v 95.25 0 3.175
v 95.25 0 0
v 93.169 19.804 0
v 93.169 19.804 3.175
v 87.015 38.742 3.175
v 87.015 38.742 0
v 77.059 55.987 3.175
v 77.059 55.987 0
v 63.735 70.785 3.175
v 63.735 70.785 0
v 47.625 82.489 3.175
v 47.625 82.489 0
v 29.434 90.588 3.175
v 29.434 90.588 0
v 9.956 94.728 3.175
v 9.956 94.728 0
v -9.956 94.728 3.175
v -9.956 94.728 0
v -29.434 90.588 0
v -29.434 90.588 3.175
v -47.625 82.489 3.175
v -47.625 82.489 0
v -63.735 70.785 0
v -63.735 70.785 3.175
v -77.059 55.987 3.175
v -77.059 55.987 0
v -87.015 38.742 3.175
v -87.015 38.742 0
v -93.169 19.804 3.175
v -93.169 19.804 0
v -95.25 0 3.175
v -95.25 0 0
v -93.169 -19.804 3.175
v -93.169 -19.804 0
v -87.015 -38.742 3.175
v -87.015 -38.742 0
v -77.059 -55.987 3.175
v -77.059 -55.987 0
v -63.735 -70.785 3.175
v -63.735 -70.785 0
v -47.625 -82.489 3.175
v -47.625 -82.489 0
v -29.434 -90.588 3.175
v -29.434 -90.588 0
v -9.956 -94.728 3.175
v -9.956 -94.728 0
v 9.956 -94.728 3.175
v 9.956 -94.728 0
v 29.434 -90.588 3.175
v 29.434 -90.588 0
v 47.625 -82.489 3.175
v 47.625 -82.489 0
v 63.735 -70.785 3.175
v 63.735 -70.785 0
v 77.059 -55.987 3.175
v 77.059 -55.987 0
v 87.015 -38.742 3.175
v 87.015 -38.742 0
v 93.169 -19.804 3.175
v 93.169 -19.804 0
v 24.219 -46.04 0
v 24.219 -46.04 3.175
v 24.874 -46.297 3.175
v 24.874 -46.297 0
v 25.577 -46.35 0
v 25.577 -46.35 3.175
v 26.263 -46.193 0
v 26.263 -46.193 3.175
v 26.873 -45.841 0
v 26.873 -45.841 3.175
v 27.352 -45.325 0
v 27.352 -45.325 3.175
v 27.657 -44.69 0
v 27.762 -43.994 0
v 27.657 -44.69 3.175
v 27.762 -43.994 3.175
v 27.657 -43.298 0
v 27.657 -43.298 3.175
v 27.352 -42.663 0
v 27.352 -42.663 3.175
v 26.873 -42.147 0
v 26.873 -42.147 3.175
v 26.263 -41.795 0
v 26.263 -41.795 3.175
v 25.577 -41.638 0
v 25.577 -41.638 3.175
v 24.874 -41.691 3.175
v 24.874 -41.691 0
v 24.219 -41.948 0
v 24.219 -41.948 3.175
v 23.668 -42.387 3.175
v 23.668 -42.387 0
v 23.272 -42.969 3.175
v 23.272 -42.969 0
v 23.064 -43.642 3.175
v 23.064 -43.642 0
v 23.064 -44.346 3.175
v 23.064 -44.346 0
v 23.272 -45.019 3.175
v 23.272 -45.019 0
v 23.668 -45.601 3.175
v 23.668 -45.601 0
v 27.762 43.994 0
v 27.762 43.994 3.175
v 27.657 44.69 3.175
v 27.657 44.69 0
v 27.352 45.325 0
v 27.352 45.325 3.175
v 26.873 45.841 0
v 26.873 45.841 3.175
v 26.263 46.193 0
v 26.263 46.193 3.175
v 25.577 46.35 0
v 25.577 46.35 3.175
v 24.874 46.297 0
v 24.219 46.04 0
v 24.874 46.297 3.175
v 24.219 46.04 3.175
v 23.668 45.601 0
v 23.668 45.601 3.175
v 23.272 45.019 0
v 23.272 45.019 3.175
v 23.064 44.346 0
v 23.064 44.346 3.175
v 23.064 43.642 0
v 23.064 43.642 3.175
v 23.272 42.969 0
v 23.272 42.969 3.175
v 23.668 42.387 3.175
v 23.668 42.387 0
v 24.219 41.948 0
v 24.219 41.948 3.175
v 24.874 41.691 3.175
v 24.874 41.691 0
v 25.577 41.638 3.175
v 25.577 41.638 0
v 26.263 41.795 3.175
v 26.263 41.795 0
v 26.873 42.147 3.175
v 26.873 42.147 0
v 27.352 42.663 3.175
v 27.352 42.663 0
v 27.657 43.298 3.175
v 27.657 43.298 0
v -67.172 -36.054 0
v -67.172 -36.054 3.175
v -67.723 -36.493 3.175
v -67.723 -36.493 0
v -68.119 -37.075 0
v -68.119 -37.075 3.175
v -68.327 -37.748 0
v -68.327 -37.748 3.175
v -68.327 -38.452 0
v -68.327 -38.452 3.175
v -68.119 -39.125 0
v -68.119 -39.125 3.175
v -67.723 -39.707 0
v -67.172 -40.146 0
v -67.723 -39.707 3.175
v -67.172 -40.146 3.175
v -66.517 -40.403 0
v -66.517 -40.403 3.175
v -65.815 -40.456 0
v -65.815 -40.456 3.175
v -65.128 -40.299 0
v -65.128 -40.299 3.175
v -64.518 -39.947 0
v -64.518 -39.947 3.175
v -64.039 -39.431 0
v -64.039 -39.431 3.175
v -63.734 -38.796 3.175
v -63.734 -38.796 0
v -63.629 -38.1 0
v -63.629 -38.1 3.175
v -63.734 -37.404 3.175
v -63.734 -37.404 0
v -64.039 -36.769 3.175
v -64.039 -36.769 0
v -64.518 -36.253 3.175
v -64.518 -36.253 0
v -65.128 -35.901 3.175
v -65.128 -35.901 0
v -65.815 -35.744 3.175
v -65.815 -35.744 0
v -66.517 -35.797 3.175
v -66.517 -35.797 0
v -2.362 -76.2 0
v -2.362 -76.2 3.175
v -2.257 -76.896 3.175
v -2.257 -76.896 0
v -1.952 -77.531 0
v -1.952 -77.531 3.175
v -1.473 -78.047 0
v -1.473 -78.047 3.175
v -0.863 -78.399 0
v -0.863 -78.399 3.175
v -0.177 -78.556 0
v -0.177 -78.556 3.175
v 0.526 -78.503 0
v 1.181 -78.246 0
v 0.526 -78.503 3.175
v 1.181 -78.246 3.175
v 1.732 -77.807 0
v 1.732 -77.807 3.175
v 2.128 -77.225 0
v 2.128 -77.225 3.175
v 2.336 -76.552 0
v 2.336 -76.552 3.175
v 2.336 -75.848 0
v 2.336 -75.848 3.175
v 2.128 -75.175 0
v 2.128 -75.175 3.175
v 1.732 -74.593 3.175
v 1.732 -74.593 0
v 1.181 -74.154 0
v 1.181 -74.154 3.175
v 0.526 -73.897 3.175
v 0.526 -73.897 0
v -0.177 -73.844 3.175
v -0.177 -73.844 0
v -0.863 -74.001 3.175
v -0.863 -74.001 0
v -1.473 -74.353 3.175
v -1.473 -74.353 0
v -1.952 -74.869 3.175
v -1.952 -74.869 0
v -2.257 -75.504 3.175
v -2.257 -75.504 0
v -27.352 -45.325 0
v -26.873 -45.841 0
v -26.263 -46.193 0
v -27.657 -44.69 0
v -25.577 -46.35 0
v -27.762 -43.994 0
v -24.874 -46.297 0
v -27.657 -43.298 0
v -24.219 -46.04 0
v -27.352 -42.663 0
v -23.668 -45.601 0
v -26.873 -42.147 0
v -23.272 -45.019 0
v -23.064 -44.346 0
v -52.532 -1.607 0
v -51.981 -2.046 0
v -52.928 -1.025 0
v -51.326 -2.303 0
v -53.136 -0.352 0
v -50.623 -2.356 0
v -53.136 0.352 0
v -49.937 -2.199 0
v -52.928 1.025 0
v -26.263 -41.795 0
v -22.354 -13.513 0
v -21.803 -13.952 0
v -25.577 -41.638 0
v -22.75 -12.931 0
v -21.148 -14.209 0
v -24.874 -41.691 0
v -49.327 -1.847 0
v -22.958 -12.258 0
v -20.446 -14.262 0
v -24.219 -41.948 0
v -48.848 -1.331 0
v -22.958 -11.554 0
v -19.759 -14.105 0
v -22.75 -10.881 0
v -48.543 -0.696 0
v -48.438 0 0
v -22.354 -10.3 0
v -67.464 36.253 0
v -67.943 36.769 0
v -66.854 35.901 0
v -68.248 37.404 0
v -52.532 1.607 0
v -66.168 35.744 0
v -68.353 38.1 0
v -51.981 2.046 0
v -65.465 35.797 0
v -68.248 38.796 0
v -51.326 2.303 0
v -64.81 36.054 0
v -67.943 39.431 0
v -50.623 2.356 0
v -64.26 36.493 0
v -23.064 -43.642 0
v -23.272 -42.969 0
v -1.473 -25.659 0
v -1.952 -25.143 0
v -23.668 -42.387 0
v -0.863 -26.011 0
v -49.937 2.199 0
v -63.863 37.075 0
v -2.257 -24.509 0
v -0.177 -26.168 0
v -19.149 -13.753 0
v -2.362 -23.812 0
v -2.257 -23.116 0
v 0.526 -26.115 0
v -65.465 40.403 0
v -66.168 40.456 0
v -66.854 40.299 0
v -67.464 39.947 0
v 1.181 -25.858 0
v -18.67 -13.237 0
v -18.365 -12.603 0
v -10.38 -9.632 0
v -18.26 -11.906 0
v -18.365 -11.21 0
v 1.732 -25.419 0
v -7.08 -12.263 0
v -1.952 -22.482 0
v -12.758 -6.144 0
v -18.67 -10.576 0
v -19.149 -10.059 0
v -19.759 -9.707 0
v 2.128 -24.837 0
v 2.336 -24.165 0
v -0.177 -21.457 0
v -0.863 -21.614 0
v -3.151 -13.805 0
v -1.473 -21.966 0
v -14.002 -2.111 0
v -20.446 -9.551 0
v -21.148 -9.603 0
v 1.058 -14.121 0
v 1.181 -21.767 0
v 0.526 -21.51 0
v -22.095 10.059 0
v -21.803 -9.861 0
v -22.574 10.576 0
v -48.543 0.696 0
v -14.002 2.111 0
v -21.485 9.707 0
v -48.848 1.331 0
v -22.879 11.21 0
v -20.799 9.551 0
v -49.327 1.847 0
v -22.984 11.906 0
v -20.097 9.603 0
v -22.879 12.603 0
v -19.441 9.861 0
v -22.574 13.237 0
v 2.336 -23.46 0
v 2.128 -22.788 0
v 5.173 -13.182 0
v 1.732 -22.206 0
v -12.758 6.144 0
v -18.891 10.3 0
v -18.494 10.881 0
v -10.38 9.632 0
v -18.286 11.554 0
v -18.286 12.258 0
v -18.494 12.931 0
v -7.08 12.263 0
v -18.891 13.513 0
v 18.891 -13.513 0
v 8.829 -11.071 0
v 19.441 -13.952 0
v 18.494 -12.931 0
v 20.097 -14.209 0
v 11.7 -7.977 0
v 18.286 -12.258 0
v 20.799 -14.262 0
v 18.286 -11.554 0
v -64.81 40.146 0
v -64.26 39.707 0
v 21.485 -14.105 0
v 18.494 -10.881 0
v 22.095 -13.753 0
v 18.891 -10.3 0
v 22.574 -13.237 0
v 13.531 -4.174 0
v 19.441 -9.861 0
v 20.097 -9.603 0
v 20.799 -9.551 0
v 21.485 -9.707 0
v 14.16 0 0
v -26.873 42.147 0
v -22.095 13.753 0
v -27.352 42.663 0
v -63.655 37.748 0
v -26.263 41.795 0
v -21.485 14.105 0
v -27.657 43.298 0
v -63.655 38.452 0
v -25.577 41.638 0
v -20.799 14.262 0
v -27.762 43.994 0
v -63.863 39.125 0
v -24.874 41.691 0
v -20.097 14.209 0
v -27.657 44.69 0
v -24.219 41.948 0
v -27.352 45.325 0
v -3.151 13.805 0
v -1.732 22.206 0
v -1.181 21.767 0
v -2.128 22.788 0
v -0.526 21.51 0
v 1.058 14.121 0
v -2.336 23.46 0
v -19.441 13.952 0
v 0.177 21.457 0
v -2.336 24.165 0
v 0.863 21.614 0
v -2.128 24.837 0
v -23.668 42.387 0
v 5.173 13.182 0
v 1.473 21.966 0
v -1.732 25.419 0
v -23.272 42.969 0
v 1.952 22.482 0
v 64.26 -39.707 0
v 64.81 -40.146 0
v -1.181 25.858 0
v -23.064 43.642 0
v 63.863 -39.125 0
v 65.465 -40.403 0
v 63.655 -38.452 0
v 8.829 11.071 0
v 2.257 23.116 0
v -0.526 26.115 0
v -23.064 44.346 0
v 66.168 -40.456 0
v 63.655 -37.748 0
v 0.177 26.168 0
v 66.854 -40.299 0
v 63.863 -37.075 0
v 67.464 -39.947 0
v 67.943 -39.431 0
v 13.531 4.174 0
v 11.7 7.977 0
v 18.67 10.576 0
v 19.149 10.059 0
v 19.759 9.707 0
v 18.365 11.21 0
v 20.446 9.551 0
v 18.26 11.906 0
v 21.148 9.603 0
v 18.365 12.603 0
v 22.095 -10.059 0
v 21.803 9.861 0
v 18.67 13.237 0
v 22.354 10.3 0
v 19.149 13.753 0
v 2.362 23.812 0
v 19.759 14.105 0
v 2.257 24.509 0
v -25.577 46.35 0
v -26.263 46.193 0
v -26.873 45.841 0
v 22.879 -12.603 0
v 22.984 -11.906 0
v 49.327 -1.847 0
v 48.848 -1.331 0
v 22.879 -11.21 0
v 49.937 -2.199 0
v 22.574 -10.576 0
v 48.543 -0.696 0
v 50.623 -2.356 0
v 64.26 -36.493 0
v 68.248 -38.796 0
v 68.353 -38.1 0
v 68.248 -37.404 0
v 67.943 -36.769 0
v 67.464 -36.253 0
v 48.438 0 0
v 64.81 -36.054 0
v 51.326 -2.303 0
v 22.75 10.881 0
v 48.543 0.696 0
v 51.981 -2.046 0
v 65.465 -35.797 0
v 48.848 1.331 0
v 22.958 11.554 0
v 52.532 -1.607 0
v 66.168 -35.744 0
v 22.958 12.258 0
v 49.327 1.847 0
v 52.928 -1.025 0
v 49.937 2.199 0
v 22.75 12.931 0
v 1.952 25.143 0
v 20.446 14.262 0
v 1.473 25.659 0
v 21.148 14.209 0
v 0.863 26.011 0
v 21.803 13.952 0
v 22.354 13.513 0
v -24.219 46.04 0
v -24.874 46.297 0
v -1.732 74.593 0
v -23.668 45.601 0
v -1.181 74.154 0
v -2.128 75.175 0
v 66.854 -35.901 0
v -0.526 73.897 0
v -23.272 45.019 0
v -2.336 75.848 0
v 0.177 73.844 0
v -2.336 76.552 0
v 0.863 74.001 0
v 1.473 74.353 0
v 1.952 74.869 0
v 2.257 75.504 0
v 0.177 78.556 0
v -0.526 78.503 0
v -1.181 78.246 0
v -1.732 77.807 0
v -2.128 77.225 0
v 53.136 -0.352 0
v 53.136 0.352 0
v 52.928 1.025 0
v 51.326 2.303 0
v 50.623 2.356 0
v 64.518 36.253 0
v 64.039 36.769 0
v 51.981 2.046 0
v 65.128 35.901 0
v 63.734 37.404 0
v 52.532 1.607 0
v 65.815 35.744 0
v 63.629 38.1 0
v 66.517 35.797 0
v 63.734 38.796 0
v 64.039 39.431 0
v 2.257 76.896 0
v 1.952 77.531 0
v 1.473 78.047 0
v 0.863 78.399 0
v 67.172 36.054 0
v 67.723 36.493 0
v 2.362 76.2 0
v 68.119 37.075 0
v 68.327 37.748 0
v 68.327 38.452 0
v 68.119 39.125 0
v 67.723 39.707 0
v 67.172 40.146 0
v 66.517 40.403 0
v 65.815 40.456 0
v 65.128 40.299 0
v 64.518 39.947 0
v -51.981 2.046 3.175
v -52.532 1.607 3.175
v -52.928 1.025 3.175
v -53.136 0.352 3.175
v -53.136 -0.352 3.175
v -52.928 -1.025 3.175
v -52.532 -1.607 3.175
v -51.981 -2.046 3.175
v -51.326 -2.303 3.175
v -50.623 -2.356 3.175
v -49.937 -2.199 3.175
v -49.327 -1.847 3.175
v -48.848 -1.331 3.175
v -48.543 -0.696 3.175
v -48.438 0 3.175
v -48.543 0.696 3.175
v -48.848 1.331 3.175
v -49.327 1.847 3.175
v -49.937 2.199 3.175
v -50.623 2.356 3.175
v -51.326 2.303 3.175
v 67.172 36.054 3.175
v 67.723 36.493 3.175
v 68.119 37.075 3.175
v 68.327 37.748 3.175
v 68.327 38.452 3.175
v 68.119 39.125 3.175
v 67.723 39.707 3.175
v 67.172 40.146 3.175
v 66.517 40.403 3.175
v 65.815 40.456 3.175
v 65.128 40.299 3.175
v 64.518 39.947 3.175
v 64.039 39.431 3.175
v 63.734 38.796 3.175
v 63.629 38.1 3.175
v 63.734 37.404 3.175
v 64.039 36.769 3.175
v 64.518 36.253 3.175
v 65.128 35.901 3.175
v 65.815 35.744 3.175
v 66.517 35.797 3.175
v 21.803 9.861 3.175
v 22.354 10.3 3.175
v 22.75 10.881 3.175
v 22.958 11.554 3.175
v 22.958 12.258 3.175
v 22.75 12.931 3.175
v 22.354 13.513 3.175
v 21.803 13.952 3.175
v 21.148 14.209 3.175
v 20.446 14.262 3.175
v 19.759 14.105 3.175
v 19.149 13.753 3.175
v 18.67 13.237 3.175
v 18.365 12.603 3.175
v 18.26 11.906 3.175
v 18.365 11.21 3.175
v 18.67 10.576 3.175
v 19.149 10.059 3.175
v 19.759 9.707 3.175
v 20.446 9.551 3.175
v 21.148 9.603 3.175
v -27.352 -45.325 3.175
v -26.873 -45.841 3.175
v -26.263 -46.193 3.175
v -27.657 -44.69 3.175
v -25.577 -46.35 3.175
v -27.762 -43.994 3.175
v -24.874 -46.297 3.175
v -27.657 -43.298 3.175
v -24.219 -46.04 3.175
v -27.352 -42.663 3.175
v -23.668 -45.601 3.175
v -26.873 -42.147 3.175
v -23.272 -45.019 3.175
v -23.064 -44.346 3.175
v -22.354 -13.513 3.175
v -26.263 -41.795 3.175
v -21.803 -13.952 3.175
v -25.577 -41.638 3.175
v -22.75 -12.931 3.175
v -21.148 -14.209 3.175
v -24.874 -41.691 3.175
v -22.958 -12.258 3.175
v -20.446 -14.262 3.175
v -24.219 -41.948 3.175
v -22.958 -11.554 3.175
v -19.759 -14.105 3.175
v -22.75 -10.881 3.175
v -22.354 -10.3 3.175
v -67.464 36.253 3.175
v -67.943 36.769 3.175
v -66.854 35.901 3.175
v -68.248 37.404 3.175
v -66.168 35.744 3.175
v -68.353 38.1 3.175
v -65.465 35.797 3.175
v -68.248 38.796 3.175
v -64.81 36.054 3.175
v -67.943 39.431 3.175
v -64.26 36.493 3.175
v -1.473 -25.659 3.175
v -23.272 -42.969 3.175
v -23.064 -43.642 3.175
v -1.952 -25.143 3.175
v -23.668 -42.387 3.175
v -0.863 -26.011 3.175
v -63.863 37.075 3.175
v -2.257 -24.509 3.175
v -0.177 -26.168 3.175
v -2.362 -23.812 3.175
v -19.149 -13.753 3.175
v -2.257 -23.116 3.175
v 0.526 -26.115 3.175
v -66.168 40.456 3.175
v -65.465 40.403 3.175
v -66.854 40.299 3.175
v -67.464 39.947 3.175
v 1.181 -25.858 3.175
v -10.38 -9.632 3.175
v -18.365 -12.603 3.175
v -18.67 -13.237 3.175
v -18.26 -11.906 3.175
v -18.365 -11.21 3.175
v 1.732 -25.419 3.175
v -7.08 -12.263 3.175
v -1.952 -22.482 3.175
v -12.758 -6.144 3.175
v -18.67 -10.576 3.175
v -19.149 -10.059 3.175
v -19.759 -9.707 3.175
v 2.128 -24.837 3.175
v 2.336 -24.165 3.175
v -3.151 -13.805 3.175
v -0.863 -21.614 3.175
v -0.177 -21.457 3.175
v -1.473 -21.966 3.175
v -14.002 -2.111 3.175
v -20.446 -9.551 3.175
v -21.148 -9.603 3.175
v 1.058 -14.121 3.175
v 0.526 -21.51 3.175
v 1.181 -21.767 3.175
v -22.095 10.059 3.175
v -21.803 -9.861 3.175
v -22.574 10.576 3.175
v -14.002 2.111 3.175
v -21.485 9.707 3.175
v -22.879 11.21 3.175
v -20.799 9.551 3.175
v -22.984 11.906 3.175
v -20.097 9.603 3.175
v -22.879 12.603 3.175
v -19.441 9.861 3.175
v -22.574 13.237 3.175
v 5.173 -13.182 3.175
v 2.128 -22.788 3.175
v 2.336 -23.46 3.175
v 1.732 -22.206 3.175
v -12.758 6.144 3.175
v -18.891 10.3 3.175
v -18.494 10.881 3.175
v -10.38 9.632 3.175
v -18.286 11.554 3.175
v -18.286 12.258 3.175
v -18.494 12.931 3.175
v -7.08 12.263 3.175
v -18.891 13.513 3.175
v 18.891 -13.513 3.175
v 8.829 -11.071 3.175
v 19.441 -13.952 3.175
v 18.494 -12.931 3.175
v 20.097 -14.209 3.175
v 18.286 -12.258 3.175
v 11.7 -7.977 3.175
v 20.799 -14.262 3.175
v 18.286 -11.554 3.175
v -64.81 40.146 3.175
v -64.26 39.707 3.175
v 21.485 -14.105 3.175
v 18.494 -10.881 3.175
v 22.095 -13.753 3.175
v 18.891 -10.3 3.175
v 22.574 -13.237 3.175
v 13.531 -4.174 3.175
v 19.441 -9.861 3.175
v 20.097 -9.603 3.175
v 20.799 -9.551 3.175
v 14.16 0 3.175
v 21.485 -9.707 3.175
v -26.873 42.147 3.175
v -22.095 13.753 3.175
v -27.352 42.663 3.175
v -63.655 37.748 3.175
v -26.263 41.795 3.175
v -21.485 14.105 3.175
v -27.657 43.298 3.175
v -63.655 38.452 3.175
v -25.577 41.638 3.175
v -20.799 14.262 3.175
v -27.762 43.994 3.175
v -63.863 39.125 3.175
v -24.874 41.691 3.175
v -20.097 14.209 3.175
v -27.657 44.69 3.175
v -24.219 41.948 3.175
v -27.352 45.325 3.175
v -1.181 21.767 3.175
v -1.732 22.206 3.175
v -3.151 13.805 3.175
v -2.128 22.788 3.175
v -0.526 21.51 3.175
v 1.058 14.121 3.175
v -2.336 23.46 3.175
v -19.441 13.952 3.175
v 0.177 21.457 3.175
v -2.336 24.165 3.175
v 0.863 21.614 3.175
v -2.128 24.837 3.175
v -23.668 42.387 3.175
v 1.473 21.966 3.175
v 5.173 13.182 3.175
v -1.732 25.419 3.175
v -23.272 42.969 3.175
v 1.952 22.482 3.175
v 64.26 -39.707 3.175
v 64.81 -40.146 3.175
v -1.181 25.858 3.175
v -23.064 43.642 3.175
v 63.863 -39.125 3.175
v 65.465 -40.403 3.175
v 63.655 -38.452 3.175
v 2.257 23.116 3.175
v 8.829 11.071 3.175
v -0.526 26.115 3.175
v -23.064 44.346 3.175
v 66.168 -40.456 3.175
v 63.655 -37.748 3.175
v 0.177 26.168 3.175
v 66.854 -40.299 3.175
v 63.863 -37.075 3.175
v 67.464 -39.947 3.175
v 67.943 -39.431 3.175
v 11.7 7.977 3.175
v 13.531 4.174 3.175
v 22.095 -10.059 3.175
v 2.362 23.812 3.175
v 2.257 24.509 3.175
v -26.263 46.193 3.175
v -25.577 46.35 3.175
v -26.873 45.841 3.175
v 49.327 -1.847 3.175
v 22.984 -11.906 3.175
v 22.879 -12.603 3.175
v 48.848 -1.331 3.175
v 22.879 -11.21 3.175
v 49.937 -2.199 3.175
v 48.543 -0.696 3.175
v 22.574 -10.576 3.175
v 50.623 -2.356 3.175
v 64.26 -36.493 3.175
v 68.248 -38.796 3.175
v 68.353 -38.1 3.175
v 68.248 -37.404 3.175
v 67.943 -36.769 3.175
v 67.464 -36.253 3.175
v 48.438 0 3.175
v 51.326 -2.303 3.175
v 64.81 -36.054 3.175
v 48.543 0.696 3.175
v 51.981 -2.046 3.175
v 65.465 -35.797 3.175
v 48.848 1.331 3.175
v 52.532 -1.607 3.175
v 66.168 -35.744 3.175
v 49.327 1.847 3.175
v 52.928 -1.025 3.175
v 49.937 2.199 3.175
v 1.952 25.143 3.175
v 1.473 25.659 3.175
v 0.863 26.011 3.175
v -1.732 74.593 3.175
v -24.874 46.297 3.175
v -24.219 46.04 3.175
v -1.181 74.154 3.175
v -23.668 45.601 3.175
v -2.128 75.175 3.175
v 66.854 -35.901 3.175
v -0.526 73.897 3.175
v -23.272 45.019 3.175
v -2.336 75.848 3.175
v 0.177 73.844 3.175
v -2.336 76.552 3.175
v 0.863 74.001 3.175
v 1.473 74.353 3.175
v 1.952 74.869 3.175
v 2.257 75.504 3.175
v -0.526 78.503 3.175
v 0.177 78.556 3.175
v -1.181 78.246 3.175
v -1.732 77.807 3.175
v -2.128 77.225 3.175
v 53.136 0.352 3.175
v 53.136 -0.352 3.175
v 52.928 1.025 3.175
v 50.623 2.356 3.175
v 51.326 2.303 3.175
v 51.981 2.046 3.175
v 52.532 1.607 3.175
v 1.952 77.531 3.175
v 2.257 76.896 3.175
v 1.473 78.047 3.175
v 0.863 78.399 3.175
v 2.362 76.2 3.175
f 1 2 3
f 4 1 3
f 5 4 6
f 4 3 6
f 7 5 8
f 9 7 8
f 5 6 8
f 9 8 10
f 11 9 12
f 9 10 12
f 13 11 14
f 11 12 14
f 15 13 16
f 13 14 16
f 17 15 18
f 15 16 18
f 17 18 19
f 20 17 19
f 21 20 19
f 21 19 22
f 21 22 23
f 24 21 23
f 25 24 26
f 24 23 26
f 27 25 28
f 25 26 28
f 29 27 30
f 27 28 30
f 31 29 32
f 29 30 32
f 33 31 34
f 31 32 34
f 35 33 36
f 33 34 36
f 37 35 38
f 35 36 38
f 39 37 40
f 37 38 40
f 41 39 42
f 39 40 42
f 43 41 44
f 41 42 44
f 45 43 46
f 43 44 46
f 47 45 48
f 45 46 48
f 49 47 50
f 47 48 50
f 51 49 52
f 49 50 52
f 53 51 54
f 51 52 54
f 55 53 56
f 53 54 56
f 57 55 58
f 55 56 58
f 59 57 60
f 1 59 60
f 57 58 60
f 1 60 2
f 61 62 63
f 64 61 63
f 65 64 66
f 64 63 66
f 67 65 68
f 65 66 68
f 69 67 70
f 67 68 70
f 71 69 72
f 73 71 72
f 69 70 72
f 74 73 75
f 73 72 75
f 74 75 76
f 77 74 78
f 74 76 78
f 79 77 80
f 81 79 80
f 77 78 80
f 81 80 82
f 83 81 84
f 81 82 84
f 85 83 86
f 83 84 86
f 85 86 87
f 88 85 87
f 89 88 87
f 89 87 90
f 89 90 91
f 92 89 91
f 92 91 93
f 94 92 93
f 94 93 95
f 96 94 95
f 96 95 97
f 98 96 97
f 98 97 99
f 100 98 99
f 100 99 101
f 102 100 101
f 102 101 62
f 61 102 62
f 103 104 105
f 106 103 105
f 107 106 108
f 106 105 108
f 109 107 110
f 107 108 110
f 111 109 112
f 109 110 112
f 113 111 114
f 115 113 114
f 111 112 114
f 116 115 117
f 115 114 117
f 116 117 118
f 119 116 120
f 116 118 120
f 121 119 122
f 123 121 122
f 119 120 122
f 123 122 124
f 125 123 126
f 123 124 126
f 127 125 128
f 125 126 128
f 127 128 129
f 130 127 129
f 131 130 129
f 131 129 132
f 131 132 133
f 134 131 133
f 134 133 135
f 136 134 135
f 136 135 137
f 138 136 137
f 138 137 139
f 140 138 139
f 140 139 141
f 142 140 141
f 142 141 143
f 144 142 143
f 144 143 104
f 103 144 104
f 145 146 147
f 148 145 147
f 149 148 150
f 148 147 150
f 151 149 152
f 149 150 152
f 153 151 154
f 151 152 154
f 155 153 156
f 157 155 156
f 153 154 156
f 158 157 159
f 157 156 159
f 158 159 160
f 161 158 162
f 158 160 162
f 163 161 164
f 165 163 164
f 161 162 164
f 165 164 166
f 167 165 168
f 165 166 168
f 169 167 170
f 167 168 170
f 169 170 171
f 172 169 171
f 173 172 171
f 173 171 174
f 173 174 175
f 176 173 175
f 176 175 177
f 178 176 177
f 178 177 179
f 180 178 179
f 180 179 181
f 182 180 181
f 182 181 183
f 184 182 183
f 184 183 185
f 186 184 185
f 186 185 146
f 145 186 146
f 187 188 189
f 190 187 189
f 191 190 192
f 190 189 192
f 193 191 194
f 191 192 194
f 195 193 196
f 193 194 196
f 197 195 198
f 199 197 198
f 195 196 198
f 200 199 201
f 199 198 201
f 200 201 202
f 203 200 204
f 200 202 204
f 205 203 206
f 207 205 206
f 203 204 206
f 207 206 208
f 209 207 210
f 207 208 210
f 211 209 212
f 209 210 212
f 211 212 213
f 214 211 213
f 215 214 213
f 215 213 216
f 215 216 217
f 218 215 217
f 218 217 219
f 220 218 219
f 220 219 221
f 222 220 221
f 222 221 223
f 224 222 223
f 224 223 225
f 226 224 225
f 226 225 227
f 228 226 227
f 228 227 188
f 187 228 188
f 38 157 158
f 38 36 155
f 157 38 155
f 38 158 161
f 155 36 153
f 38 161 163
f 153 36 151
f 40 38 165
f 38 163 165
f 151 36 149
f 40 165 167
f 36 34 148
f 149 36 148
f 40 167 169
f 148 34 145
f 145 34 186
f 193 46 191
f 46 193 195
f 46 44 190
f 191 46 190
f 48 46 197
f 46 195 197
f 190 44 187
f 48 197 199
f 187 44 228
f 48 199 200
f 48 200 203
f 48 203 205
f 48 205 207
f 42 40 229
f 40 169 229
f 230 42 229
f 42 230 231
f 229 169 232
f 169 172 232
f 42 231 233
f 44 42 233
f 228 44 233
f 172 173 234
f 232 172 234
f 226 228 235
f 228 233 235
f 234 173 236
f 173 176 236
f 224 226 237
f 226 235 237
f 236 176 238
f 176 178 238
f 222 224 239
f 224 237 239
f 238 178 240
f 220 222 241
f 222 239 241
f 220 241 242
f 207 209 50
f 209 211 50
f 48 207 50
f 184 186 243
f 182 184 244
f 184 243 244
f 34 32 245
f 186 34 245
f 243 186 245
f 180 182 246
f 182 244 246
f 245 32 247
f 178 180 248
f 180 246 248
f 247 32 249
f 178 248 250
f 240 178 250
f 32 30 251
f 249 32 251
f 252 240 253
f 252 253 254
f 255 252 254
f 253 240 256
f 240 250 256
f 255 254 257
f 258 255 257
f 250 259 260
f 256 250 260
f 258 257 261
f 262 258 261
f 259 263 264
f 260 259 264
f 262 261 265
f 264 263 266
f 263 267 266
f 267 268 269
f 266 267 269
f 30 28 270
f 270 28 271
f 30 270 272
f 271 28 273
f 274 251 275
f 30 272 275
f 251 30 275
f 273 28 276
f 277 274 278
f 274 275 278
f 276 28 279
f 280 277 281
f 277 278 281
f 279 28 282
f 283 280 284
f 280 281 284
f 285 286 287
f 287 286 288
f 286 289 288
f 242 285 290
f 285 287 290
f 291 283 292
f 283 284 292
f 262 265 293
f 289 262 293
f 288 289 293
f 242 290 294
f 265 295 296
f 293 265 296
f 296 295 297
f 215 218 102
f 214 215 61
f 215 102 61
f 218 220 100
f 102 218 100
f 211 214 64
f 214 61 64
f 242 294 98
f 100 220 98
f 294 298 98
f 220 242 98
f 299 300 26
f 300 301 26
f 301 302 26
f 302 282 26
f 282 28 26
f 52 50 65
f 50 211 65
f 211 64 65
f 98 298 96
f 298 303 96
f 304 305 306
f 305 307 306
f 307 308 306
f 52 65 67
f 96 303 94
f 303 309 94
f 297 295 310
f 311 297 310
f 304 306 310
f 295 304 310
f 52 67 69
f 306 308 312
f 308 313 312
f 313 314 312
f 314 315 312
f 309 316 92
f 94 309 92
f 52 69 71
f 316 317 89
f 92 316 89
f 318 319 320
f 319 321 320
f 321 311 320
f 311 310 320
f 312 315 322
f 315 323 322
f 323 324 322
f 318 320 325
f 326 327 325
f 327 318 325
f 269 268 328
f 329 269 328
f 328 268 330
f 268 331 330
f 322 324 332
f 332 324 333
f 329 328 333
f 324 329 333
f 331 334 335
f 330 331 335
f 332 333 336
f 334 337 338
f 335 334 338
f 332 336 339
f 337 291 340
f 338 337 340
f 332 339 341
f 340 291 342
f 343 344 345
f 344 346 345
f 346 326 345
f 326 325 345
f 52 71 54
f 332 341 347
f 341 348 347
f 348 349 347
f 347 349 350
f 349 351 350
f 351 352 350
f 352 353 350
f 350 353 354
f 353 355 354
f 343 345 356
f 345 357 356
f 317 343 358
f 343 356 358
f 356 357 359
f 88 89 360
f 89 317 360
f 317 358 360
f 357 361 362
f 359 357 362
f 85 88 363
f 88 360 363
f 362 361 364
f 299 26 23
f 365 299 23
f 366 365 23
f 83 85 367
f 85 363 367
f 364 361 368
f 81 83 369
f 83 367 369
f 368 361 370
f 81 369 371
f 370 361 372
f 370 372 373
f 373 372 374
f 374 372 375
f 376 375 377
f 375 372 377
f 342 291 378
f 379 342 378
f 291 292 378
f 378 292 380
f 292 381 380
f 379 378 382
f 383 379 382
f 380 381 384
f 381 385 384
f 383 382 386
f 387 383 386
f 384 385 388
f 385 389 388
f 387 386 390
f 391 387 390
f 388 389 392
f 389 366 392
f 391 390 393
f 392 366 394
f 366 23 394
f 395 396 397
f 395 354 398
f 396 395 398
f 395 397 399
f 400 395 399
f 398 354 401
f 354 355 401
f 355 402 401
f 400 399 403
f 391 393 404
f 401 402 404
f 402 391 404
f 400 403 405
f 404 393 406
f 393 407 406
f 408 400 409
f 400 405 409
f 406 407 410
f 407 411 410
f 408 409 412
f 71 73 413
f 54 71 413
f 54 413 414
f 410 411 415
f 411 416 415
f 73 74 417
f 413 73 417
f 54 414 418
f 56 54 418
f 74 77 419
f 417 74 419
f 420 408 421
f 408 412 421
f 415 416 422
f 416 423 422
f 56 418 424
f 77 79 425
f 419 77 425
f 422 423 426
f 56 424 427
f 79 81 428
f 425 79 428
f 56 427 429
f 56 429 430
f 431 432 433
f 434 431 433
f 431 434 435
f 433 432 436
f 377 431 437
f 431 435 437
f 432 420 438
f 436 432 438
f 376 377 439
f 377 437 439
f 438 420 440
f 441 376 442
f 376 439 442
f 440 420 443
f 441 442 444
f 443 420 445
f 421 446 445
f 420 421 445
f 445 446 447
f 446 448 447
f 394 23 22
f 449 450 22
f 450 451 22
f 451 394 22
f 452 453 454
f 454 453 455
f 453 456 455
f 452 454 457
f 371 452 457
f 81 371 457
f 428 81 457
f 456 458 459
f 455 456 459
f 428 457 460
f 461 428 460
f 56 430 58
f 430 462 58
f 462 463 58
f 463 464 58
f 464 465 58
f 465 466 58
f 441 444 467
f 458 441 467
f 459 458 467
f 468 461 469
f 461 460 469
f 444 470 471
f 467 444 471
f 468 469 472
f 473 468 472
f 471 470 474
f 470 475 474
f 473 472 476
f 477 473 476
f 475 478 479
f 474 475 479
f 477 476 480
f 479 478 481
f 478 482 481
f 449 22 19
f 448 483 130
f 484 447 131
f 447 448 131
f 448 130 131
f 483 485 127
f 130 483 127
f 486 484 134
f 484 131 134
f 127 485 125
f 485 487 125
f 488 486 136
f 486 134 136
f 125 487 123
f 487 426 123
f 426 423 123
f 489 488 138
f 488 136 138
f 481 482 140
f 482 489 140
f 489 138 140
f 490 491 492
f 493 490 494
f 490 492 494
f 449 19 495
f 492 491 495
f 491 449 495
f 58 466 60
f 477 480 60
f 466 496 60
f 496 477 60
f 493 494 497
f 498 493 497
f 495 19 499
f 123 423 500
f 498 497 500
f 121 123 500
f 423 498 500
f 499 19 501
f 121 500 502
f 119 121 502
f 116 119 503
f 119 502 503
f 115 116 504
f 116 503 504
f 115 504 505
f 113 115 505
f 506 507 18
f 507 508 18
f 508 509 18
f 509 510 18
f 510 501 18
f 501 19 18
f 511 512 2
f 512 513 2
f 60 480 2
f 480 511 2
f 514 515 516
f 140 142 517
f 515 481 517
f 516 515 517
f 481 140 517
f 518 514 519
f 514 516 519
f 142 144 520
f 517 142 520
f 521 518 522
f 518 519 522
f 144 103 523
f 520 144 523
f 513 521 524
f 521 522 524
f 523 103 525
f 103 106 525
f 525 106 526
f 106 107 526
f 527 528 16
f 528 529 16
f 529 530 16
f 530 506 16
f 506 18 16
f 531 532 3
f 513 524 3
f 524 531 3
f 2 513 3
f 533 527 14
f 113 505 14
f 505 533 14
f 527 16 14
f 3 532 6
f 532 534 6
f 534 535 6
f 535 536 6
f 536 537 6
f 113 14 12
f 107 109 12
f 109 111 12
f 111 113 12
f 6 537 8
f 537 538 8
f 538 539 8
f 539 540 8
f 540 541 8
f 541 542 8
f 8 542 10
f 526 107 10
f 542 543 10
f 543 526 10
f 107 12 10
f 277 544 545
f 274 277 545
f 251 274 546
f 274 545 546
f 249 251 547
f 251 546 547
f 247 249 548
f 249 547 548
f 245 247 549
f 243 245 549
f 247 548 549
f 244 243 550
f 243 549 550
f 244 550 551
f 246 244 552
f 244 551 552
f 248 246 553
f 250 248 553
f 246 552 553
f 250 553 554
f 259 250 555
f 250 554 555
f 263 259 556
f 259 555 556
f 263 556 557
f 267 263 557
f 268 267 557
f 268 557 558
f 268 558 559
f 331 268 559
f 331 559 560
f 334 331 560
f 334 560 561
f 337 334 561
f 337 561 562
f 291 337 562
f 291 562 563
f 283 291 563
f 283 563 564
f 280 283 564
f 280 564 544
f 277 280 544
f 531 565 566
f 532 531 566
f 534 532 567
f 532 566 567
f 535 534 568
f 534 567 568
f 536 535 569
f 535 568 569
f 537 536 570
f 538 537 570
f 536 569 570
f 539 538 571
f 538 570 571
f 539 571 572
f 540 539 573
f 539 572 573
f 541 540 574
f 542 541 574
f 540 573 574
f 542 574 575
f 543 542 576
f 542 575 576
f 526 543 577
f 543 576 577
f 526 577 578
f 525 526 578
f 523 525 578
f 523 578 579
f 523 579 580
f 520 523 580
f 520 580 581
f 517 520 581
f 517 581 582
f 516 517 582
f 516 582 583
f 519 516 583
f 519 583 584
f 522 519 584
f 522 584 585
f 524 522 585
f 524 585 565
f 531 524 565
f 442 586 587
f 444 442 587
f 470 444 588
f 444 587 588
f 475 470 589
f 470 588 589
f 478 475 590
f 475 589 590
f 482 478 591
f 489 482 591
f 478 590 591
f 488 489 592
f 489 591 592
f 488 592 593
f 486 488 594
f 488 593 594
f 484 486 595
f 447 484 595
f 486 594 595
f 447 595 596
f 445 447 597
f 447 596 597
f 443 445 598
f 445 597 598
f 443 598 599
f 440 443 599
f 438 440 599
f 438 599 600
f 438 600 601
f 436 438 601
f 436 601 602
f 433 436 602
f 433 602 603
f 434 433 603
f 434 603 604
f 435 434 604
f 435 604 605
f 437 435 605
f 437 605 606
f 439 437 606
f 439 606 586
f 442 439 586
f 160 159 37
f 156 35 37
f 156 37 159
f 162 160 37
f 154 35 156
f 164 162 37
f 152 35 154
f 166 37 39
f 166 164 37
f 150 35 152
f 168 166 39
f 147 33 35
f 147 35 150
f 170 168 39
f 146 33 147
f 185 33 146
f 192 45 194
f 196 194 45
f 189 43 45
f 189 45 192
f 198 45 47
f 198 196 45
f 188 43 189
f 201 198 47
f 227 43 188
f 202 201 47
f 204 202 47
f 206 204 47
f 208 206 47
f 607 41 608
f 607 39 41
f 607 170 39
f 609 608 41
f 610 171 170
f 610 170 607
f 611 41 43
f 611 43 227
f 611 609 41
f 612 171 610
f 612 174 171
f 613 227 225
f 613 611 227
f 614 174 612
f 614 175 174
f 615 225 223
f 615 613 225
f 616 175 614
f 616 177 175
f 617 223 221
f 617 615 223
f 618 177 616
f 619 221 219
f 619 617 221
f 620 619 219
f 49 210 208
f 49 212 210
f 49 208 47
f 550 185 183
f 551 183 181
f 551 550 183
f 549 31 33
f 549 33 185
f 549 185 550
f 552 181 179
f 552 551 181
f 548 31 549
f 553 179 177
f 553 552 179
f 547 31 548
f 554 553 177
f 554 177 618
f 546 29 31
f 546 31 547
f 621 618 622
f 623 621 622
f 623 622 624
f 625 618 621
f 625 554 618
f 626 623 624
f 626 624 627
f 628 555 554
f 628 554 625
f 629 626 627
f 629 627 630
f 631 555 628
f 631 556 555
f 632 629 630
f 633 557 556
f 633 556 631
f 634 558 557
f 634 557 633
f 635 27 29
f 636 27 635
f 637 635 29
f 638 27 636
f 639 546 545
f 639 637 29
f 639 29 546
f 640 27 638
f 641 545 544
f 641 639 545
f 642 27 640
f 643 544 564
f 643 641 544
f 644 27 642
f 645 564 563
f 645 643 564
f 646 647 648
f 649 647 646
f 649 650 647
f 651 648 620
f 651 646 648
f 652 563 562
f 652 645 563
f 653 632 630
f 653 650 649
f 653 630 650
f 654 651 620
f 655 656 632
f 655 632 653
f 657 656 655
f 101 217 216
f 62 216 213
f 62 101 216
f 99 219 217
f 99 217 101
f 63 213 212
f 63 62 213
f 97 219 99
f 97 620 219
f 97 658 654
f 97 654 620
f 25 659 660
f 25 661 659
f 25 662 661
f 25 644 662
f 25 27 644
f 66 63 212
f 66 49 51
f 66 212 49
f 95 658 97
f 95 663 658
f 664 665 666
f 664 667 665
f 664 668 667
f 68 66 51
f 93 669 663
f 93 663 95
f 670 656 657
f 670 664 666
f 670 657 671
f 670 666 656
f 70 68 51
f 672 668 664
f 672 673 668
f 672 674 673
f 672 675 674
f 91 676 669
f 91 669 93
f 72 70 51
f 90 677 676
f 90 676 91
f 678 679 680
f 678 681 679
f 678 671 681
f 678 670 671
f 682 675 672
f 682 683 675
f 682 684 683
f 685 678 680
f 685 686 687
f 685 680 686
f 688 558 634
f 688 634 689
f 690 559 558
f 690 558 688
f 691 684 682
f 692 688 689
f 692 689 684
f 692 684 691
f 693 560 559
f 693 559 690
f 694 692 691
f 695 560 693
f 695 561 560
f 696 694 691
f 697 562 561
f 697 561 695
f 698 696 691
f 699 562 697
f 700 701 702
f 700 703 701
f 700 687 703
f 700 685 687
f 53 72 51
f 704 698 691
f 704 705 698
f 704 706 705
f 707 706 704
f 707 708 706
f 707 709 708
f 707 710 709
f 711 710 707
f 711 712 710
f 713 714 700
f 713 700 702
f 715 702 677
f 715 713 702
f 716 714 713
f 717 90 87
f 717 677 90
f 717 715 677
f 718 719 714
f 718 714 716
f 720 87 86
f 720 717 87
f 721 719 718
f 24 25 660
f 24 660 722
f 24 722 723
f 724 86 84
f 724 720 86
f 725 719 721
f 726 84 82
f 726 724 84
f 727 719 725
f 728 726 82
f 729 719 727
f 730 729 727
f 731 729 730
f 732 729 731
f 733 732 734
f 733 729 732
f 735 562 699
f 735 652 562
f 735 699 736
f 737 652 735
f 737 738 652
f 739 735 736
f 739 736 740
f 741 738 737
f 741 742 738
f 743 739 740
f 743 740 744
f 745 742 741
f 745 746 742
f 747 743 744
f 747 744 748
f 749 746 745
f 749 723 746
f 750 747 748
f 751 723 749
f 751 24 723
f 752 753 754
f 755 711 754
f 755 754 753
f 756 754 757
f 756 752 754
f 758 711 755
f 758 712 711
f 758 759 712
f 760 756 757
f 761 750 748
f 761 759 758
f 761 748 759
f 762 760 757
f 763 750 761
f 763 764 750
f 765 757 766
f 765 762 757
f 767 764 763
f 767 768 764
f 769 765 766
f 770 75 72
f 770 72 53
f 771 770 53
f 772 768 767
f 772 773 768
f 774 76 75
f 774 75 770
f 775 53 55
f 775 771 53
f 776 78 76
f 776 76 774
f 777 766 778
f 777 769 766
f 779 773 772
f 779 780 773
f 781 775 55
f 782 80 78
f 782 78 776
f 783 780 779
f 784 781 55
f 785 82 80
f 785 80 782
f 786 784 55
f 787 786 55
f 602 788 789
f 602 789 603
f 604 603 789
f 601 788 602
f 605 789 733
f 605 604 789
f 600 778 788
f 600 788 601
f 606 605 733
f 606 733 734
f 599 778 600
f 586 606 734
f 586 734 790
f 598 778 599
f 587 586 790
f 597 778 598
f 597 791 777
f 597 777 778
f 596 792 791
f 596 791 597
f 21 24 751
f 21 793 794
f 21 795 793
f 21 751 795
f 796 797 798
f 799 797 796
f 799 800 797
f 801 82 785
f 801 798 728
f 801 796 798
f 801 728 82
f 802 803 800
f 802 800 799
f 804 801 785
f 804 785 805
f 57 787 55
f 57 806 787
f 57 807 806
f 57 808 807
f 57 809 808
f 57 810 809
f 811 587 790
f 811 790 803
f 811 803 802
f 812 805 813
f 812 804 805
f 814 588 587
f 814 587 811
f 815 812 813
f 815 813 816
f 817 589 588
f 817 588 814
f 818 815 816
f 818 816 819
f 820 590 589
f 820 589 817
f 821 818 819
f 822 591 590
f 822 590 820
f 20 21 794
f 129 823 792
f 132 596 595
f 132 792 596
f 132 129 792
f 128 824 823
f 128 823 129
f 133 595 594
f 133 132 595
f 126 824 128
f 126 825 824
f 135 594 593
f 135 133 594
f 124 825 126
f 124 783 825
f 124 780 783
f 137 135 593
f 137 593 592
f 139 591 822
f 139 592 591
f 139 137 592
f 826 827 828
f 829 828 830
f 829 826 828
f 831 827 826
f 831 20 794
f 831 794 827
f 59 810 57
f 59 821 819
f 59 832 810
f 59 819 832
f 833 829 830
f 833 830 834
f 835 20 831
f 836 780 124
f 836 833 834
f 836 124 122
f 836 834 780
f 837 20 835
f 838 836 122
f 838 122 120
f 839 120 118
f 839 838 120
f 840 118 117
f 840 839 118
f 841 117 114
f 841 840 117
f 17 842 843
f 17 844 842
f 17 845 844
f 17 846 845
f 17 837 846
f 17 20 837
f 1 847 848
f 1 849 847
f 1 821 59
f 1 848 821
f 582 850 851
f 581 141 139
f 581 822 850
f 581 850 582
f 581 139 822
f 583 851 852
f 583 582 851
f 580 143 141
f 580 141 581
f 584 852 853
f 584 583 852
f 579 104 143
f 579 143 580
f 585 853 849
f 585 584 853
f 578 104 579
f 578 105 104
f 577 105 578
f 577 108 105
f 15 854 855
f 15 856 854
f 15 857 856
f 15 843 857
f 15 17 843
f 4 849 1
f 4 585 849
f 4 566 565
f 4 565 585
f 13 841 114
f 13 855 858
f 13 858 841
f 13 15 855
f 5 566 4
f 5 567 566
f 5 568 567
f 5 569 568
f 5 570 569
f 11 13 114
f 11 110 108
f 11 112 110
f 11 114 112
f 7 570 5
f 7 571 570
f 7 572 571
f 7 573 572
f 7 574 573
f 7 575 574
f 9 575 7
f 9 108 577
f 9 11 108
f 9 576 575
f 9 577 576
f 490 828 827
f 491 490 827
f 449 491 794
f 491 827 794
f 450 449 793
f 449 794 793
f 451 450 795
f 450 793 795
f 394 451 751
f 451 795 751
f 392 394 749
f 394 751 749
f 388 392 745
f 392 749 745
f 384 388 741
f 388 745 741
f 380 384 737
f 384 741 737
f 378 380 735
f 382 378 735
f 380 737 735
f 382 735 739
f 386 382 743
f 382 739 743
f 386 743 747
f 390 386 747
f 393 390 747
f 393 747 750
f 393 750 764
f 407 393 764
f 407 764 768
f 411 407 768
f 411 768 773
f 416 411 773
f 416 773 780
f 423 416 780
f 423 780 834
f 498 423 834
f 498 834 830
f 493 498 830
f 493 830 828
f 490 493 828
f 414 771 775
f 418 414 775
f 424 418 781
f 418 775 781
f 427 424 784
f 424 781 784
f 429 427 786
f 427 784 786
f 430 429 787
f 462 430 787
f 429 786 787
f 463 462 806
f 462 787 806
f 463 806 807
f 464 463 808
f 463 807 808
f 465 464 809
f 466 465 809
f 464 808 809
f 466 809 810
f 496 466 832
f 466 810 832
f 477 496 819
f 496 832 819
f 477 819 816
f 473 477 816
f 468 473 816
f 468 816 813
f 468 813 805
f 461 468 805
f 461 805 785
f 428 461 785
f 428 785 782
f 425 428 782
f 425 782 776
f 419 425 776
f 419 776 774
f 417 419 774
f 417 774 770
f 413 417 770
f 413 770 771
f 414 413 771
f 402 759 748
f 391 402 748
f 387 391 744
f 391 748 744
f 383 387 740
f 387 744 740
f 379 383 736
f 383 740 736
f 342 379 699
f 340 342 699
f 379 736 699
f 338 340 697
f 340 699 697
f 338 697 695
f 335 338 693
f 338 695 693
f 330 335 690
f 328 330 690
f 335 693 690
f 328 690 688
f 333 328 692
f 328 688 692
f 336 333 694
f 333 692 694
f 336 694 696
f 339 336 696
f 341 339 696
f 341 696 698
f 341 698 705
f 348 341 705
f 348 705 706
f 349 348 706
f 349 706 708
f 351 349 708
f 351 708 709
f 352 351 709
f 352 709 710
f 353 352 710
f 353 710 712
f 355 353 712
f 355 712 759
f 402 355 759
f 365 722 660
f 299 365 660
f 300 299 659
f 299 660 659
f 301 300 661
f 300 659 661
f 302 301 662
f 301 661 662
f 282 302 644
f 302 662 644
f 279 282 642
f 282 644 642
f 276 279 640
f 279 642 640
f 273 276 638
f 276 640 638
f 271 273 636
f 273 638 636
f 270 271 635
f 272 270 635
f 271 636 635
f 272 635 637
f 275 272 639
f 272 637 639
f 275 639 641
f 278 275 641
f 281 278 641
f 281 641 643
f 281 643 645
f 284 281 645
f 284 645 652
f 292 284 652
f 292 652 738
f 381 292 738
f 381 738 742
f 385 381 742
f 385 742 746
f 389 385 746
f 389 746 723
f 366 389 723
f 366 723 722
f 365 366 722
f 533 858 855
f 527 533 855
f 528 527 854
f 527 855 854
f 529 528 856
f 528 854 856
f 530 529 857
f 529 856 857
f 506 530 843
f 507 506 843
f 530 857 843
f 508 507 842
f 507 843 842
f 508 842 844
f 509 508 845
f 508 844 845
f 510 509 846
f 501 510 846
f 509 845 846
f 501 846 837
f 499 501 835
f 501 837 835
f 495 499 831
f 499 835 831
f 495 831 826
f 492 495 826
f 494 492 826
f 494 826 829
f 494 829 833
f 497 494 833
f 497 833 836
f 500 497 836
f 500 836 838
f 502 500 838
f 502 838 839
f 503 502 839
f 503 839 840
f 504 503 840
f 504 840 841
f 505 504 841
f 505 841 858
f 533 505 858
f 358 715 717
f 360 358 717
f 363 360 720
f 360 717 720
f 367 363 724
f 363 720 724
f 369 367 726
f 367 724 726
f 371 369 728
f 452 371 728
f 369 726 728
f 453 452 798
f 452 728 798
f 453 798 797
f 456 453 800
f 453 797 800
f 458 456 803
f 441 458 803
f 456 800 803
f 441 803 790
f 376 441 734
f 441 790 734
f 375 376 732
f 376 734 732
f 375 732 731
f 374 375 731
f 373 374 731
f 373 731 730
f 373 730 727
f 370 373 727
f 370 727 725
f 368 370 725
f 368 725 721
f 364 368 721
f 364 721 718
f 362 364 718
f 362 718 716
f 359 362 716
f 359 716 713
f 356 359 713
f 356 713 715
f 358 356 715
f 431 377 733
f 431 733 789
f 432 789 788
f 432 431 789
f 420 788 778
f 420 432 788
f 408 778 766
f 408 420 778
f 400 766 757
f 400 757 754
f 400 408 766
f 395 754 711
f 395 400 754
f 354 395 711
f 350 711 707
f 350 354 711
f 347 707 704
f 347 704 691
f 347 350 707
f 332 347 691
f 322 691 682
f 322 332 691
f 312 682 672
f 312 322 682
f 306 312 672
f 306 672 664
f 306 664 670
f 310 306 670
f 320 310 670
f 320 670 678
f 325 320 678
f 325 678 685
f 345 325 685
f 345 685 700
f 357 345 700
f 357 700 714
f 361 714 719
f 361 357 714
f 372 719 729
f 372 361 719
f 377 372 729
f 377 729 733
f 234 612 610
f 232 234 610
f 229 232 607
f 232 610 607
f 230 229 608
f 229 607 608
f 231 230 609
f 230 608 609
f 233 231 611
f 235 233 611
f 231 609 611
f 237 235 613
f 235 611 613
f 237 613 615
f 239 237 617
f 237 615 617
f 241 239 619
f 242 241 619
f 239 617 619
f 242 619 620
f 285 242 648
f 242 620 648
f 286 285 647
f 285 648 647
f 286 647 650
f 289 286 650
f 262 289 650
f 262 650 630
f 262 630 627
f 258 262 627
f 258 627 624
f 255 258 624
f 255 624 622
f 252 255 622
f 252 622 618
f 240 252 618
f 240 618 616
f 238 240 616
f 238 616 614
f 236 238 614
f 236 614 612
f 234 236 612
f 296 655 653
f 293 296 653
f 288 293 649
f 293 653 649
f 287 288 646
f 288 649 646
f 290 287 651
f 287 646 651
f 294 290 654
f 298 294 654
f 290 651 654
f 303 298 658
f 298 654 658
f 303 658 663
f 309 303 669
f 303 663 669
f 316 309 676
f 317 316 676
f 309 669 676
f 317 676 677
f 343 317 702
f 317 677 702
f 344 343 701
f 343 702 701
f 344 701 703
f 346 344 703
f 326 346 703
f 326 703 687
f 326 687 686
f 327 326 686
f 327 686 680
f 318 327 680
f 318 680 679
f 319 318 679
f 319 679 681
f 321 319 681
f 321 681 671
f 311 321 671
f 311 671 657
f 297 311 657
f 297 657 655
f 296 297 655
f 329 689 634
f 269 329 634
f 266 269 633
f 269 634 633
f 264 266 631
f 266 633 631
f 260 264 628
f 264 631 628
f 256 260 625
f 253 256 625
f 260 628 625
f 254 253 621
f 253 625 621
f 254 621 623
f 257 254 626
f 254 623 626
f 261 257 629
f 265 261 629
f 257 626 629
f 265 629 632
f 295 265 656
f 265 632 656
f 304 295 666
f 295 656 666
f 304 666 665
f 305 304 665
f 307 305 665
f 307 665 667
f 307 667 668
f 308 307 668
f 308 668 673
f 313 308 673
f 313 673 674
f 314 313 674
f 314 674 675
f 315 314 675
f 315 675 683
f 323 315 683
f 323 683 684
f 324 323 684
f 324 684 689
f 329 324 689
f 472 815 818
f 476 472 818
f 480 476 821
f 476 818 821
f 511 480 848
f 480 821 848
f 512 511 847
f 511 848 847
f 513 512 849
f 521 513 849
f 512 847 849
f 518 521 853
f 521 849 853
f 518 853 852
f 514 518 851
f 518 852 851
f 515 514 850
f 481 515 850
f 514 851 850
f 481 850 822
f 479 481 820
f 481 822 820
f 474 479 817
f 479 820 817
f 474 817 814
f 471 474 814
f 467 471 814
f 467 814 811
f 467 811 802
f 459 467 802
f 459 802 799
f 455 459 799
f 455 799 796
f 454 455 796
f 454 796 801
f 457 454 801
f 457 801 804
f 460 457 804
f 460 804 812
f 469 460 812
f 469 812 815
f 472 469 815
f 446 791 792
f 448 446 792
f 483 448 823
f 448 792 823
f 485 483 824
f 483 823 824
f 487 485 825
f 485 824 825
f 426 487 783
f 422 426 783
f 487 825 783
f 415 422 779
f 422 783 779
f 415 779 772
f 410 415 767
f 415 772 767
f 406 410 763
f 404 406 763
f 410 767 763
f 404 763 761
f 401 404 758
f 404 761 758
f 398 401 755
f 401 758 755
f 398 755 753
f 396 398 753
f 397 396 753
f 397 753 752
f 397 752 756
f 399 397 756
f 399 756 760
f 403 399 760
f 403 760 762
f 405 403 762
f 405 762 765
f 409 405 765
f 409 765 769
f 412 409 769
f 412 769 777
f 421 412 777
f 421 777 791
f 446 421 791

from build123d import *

# Parameters (mm, degrees)
F0_R            = 95.25
F0_R_2          = 14.1605
F1_DEPTH        = 3.175
F2_R            = 2.3622
F3_DEPTH        = 3.176
F3_COPIES_COUNT = 6


# Not quite as in the source:
# - a pattern or mirror of a feature is missing from the dataset's text; its kind, count and spacing are read off the source's solid


with BuildPart() as f1:
    # F0 (on Top) → F1 (new body)
    with BuildSketch(Plane.XY):
        Circle(F0_R)
        Circle(F0_R_2, mode=Mode.SUBTRACT)
    extrude(amount=F1_DEPTH)

    # F2 (on face) → F3 (cut, through all)
    with BuildSketch(Plane.XY.offset(3.175)):
        with Locations((0, 23.8125)):
            Circle(F2_R)
        with Locations((0, 76.2)):
            Circle(F2_R)
        with Locations((25.4, 43.9940905122)):
            Circle(F2_R)
    f3 = extrude(amount=-F3_DEPTH, mode=Mode.SUBTRACT)

    # F3_copies: F3 ×6 about axis
    f3_copies_axis = Axis((0, 0, 0), (0, 0, 1))
    for i in range(1, F3_COPIES_COUNT):
        add(f3.rotate(f3_copies_axis, i * 360 / F3_COPIES_COUNT), mode=Mode.SUBTRACT)


solid = f1.part
